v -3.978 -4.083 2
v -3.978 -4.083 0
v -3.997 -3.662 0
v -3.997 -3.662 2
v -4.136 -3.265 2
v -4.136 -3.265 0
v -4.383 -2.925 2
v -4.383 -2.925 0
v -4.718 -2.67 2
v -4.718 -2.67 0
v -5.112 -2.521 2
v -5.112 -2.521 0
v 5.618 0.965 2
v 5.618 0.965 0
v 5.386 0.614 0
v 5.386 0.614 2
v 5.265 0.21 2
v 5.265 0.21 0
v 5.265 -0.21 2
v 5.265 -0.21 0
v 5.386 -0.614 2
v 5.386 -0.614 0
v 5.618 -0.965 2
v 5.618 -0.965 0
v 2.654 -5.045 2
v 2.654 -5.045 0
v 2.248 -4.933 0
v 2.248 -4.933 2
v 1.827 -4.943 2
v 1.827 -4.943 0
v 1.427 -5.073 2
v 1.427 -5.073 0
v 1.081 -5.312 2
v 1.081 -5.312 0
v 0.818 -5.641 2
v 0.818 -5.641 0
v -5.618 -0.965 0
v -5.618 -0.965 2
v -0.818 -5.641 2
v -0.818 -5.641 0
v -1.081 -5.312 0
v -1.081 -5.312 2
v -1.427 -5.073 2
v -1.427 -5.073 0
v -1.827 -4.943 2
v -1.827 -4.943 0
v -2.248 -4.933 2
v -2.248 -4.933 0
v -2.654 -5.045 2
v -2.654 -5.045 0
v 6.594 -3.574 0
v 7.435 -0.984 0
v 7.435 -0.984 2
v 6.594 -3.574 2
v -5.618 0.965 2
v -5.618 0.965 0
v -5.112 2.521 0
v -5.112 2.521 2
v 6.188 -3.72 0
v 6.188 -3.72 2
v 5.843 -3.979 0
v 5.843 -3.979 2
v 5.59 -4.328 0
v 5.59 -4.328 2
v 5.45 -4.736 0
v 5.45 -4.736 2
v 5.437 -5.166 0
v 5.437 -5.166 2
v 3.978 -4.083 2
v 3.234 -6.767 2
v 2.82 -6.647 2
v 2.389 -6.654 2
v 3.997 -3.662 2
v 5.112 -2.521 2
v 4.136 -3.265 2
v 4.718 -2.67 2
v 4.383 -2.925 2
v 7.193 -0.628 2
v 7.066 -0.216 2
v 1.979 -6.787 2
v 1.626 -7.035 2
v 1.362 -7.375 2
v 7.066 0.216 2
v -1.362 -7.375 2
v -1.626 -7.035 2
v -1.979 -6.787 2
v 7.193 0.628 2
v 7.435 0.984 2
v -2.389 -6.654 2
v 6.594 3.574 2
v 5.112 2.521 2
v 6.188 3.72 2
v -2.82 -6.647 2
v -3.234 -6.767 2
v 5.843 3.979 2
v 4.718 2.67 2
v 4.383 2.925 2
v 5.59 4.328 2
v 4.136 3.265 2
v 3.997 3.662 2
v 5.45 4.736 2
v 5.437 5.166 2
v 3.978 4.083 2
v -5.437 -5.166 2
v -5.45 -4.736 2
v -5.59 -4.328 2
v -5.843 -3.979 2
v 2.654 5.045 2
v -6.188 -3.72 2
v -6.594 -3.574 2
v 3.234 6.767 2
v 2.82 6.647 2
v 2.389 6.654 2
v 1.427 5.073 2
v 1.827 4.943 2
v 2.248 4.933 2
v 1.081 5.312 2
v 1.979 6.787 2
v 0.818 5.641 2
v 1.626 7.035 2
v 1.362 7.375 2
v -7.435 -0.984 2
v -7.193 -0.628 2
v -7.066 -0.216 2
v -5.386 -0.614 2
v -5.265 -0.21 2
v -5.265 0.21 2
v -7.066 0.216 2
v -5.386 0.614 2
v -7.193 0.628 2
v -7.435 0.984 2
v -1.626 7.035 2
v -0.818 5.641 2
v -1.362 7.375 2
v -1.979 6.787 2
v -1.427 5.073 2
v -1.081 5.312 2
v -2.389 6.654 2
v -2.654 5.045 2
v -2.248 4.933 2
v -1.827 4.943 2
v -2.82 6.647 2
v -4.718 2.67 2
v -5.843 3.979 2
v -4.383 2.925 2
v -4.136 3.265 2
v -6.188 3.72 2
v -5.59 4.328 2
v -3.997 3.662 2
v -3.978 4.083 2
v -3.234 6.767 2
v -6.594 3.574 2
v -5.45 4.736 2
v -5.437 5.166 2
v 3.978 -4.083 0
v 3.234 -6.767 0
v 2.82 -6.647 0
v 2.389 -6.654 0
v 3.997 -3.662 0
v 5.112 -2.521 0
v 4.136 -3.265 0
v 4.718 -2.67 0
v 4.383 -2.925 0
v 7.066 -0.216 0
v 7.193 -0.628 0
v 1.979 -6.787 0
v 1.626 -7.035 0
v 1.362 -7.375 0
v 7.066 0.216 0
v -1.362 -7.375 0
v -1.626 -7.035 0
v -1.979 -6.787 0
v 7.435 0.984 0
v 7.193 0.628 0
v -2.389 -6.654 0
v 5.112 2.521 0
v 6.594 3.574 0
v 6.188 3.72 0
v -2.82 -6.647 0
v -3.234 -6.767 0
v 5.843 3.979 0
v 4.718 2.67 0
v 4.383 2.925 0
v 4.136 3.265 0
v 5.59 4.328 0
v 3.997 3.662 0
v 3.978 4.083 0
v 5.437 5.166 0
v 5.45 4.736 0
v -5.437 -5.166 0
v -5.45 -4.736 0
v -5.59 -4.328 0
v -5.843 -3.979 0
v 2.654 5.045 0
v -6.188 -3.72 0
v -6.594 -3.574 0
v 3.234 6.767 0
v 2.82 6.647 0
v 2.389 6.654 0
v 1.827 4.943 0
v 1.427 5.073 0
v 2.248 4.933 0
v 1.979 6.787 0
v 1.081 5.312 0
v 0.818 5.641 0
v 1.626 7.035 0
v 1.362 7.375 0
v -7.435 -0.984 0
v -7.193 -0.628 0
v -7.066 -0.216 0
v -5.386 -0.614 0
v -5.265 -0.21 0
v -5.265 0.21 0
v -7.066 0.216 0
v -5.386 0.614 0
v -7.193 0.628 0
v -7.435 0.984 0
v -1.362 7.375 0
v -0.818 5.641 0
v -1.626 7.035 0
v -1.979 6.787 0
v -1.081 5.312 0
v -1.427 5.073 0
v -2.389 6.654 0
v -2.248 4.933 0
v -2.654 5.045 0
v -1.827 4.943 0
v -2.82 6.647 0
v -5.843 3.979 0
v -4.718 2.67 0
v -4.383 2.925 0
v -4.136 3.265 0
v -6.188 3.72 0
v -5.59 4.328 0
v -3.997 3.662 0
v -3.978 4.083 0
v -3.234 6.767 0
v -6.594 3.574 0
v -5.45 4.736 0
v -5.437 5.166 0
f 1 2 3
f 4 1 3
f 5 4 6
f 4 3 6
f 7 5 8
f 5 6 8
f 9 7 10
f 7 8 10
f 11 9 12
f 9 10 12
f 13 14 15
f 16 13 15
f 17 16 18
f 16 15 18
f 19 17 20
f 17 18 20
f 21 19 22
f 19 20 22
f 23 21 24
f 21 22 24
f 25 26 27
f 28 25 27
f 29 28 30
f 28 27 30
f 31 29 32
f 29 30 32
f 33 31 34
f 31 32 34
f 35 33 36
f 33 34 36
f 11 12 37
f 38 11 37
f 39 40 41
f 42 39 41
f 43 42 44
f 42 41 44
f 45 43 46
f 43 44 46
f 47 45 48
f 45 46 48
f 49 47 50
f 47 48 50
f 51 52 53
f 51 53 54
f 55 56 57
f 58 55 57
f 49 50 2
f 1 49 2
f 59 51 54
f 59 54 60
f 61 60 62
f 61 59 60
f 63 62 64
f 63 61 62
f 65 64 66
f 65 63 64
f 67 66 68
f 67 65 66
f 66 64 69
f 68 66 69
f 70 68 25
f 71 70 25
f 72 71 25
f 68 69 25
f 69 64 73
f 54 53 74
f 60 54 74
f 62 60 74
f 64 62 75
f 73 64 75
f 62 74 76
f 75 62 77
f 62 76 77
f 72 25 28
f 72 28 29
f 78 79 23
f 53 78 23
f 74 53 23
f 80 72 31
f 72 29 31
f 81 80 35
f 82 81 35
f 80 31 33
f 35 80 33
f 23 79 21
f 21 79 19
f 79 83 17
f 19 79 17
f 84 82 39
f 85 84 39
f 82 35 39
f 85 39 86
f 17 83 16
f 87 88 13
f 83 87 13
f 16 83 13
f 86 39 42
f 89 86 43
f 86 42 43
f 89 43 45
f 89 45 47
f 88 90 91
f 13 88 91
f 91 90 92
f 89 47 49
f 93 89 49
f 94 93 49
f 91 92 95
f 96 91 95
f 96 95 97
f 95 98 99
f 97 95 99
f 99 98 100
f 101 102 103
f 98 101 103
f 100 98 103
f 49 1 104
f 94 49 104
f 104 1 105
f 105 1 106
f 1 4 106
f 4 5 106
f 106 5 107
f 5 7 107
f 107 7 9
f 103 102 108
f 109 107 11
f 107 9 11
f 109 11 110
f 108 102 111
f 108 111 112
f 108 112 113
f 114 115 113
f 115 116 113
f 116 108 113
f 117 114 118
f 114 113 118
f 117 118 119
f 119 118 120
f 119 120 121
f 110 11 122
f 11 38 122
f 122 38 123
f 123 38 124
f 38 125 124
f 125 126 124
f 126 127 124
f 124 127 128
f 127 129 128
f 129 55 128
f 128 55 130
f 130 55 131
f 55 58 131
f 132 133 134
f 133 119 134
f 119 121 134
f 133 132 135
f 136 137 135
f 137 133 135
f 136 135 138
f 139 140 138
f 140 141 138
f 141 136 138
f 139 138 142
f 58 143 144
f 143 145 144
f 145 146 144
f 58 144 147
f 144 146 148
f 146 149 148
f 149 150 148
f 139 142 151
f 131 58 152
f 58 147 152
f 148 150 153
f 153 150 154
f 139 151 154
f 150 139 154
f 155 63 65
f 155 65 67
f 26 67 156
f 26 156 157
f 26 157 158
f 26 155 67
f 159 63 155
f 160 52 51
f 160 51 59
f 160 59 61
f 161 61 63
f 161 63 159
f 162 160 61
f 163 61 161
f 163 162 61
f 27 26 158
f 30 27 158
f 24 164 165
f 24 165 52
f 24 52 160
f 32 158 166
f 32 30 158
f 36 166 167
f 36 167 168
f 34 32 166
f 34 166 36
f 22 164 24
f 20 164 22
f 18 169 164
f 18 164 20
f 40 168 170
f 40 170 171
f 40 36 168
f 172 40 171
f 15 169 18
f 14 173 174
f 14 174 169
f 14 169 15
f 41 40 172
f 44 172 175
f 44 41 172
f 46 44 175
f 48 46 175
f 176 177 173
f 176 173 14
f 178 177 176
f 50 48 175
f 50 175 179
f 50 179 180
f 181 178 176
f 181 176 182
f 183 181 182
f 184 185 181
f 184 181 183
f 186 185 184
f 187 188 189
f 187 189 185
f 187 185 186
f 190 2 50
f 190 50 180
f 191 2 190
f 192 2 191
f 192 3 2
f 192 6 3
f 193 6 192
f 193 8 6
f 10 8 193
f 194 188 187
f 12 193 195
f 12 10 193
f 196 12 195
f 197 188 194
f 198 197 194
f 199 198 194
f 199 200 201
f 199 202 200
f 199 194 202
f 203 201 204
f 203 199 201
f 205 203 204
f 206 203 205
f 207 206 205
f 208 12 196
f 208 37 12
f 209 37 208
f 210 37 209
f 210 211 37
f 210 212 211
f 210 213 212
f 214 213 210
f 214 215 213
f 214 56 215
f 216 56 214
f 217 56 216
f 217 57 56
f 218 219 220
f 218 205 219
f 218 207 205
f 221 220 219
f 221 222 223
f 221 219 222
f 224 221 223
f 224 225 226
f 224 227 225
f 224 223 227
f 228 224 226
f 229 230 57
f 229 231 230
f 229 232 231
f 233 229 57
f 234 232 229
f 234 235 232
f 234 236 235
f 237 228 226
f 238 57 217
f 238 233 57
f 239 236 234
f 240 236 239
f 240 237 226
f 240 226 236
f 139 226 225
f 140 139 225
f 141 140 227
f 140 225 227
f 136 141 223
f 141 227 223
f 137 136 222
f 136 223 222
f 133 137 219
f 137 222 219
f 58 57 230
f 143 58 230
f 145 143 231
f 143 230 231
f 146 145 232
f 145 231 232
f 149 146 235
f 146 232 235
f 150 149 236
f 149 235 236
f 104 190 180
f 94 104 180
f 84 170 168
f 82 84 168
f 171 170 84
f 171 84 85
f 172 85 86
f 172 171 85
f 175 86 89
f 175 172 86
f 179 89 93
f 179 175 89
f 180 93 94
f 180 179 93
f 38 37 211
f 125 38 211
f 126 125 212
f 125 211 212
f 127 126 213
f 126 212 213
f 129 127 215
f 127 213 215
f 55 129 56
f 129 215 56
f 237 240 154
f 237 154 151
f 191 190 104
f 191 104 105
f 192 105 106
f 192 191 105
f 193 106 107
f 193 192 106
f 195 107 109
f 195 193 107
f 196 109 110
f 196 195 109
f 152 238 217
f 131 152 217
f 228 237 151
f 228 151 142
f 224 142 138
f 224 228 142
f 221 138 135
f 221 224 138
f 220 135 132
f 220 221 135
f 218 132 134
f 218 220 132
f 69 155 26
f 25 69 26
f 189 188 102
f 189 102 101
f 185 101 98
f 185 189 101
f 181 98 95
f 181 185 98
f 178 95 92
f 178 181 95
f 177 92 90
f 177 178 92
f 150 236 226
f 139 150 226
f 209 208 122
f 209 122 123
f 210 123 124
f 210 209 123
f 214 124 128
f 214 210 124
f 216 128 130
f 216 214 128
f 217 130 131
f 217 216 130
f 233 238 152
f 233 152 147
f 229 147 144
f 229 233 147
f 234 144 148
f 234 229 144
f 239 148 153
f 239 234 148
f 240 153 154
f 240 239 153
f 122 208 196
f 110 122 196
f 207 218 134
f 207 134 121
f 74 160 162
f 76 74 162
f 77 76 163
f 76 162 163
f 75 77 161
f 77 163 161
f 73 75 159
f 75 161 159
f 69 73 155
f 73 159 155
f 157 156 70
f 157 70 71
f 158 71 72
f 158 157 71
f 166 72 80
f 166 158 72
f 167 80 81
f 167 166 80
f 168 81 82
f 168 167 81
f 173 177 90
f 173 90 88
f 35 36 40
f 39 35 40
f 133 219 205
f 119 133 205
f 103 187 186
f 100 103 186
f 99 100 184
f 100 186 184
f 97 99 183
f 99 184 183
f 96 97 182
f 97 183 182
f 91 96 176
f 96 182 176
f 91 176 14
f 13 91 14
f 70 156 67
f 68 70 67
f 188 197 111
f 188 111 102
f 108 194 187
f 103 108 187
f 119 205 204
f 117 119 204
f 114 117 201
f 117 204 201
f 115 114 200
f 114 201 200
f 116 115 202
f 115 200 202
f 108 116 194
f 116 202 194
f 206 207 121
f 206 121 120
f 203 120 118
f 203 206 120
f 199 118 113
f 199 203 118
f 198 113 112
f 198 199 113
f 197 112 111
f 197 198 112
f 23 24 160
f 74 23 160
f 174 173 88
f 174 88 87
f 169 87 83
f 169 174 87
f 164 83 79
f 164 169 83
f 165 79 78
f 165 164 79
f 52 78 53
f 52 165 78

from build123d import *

# Parameters (mm, degrees)
PAD001_DEPTH = 2


with BuildPart() as part:
    # CopySketch002 → Pad001 (new body)
    with BuildSketch(Plane.XY):
        with BuildLine():
            ThreePointArc((1.361587, 7.37537), (2.17857, 6.704948), (3.233587, 6.76712))
            Line((3.233587, 6.76712), (5.43668, 5.166479))
            ThreePointArc((5.43668, 5.166479), (5.70357, 4.143886), (6.59364, 3.574061))
            Line((6.59364, 3.574061), (7.435147, 0.984169))
            ThreePointArc((7.435147, 0.984169), (7.05, 0), (7.435147, -0.984169))
            Line((7.435147, -0.984169), (6.59364, -3.574061))
            ThreePointArc((6.59364, -3.574061), (5.70357, -4.143886), (5.43668, -5.166479))
            Line((3.233587, -6.76712), (5.43668, -5.166479))
            ThreePointArc((3.233587, -6.76712), (2.17857, -6.704948), (1.361587, -7.37537))
            Line((-1.361587, -7.37537), (1.361587, -7.37537))
            ThreePointArc((-1.361587, -7.37537), (-2.17857, -6.704948), (-3.233587, -6.76712))
            Line((-5.43668, -5.166479), (-3.233587, -6.76712))
            ThreePointArc((-5.43668, -5.166479), (-5.70357, -4.143886), (-6.59364, -3.574061))
            Line((-7.435147, -0.984169), (-6.59364, -3.574061))
            ThreePointArc((-7.435147, -0.984169), (-7.05, 0), (-7.435147, 0.984169))
            Line((-6.59364, 3.574061), (-7.435147, 0.984169))
            ThreePointArc((-6.59364, 3.574061), (-5.70357, 4.143886), (-5.43668, 5.166479))
            Line((-5.43668, 5.166479), (-3.233587, 6.76712))
            ThreePointArc((-3.233587, 6.76712), (-2.17857, 6.704948), (-1.361587, 7.37537))
            Line((-1.361587, 7.37537), (1.361587, 7.37537))
        make_face()
        with BuildLine():
            Line((5.617724, -0.964976), (5.112033, -2.521333))
            ThreePointArc((5.112033, -2.521333), (4.247339, -3.085873), (3.977636, -4.082697))
            Line((3.977636, -4.082697), (2.653719, -5.044579))
            ThreePointArc((2.653719, -5.044579), (1.622339, -4.993047), (0.818226, -5.640967))
            Line((0.818226, -5.640967), (-0.818226, -5.640967))
            ThreePointArc((-0.818226, -5.640967), (-1.622339, -4.993047), (-2.653719, -5.044579))
            Line((-2.653719, -5.044579), (-3.977636, -4.082697))
            ThreePointArc((-3.977636, -4.082697), (-4.247339, -3.085873), (-5.112033, -2.521333))
            Line((-5.112033, -2.521333), (-5.617724, -0.964976))
            ThreePointArc((-5.617724, -0.964976), (-5.25, 0), (-5.617724, 0.964976))
            Line((-5.617724, 0.964976), (-5.112033, 2.521333))
            ThreePointArc((-5.112033, 2.521333), (-4.247339, 3.085873), (-3.977636, 4.082697))
            Line((-3.977636, 4.082697), (-2.653719, 5.044579))
            ThreePointArc((-2.653719, 5.044579), (-1.622339, 4.993047), (-0.818226, 5.640967))
            Line((-0.818226, 5.640967), (0.818226, 5.640967))
            ThreePointArc((0.818226, 5.640967), (1.622339, 4.993047), (2.653719, 5.044579))
            Line((2.653719, 5.044579), (3.977636, 4.082697))
            ThreePointArc((3.977636, 4.082697), (4.247339, 3.085873), (5.112033, 2.521333))
            Line((5.112033, 2.521333), (5.617724, 0.964976))
            ThreePointArc((5.617724, 0.964976), (5.25, 0), (5.617724, -0.964976))
        make_face(mode=Mode.SUBTRACT)
    extrude(amount=PAD001_DEPTH)


solid = part.part
